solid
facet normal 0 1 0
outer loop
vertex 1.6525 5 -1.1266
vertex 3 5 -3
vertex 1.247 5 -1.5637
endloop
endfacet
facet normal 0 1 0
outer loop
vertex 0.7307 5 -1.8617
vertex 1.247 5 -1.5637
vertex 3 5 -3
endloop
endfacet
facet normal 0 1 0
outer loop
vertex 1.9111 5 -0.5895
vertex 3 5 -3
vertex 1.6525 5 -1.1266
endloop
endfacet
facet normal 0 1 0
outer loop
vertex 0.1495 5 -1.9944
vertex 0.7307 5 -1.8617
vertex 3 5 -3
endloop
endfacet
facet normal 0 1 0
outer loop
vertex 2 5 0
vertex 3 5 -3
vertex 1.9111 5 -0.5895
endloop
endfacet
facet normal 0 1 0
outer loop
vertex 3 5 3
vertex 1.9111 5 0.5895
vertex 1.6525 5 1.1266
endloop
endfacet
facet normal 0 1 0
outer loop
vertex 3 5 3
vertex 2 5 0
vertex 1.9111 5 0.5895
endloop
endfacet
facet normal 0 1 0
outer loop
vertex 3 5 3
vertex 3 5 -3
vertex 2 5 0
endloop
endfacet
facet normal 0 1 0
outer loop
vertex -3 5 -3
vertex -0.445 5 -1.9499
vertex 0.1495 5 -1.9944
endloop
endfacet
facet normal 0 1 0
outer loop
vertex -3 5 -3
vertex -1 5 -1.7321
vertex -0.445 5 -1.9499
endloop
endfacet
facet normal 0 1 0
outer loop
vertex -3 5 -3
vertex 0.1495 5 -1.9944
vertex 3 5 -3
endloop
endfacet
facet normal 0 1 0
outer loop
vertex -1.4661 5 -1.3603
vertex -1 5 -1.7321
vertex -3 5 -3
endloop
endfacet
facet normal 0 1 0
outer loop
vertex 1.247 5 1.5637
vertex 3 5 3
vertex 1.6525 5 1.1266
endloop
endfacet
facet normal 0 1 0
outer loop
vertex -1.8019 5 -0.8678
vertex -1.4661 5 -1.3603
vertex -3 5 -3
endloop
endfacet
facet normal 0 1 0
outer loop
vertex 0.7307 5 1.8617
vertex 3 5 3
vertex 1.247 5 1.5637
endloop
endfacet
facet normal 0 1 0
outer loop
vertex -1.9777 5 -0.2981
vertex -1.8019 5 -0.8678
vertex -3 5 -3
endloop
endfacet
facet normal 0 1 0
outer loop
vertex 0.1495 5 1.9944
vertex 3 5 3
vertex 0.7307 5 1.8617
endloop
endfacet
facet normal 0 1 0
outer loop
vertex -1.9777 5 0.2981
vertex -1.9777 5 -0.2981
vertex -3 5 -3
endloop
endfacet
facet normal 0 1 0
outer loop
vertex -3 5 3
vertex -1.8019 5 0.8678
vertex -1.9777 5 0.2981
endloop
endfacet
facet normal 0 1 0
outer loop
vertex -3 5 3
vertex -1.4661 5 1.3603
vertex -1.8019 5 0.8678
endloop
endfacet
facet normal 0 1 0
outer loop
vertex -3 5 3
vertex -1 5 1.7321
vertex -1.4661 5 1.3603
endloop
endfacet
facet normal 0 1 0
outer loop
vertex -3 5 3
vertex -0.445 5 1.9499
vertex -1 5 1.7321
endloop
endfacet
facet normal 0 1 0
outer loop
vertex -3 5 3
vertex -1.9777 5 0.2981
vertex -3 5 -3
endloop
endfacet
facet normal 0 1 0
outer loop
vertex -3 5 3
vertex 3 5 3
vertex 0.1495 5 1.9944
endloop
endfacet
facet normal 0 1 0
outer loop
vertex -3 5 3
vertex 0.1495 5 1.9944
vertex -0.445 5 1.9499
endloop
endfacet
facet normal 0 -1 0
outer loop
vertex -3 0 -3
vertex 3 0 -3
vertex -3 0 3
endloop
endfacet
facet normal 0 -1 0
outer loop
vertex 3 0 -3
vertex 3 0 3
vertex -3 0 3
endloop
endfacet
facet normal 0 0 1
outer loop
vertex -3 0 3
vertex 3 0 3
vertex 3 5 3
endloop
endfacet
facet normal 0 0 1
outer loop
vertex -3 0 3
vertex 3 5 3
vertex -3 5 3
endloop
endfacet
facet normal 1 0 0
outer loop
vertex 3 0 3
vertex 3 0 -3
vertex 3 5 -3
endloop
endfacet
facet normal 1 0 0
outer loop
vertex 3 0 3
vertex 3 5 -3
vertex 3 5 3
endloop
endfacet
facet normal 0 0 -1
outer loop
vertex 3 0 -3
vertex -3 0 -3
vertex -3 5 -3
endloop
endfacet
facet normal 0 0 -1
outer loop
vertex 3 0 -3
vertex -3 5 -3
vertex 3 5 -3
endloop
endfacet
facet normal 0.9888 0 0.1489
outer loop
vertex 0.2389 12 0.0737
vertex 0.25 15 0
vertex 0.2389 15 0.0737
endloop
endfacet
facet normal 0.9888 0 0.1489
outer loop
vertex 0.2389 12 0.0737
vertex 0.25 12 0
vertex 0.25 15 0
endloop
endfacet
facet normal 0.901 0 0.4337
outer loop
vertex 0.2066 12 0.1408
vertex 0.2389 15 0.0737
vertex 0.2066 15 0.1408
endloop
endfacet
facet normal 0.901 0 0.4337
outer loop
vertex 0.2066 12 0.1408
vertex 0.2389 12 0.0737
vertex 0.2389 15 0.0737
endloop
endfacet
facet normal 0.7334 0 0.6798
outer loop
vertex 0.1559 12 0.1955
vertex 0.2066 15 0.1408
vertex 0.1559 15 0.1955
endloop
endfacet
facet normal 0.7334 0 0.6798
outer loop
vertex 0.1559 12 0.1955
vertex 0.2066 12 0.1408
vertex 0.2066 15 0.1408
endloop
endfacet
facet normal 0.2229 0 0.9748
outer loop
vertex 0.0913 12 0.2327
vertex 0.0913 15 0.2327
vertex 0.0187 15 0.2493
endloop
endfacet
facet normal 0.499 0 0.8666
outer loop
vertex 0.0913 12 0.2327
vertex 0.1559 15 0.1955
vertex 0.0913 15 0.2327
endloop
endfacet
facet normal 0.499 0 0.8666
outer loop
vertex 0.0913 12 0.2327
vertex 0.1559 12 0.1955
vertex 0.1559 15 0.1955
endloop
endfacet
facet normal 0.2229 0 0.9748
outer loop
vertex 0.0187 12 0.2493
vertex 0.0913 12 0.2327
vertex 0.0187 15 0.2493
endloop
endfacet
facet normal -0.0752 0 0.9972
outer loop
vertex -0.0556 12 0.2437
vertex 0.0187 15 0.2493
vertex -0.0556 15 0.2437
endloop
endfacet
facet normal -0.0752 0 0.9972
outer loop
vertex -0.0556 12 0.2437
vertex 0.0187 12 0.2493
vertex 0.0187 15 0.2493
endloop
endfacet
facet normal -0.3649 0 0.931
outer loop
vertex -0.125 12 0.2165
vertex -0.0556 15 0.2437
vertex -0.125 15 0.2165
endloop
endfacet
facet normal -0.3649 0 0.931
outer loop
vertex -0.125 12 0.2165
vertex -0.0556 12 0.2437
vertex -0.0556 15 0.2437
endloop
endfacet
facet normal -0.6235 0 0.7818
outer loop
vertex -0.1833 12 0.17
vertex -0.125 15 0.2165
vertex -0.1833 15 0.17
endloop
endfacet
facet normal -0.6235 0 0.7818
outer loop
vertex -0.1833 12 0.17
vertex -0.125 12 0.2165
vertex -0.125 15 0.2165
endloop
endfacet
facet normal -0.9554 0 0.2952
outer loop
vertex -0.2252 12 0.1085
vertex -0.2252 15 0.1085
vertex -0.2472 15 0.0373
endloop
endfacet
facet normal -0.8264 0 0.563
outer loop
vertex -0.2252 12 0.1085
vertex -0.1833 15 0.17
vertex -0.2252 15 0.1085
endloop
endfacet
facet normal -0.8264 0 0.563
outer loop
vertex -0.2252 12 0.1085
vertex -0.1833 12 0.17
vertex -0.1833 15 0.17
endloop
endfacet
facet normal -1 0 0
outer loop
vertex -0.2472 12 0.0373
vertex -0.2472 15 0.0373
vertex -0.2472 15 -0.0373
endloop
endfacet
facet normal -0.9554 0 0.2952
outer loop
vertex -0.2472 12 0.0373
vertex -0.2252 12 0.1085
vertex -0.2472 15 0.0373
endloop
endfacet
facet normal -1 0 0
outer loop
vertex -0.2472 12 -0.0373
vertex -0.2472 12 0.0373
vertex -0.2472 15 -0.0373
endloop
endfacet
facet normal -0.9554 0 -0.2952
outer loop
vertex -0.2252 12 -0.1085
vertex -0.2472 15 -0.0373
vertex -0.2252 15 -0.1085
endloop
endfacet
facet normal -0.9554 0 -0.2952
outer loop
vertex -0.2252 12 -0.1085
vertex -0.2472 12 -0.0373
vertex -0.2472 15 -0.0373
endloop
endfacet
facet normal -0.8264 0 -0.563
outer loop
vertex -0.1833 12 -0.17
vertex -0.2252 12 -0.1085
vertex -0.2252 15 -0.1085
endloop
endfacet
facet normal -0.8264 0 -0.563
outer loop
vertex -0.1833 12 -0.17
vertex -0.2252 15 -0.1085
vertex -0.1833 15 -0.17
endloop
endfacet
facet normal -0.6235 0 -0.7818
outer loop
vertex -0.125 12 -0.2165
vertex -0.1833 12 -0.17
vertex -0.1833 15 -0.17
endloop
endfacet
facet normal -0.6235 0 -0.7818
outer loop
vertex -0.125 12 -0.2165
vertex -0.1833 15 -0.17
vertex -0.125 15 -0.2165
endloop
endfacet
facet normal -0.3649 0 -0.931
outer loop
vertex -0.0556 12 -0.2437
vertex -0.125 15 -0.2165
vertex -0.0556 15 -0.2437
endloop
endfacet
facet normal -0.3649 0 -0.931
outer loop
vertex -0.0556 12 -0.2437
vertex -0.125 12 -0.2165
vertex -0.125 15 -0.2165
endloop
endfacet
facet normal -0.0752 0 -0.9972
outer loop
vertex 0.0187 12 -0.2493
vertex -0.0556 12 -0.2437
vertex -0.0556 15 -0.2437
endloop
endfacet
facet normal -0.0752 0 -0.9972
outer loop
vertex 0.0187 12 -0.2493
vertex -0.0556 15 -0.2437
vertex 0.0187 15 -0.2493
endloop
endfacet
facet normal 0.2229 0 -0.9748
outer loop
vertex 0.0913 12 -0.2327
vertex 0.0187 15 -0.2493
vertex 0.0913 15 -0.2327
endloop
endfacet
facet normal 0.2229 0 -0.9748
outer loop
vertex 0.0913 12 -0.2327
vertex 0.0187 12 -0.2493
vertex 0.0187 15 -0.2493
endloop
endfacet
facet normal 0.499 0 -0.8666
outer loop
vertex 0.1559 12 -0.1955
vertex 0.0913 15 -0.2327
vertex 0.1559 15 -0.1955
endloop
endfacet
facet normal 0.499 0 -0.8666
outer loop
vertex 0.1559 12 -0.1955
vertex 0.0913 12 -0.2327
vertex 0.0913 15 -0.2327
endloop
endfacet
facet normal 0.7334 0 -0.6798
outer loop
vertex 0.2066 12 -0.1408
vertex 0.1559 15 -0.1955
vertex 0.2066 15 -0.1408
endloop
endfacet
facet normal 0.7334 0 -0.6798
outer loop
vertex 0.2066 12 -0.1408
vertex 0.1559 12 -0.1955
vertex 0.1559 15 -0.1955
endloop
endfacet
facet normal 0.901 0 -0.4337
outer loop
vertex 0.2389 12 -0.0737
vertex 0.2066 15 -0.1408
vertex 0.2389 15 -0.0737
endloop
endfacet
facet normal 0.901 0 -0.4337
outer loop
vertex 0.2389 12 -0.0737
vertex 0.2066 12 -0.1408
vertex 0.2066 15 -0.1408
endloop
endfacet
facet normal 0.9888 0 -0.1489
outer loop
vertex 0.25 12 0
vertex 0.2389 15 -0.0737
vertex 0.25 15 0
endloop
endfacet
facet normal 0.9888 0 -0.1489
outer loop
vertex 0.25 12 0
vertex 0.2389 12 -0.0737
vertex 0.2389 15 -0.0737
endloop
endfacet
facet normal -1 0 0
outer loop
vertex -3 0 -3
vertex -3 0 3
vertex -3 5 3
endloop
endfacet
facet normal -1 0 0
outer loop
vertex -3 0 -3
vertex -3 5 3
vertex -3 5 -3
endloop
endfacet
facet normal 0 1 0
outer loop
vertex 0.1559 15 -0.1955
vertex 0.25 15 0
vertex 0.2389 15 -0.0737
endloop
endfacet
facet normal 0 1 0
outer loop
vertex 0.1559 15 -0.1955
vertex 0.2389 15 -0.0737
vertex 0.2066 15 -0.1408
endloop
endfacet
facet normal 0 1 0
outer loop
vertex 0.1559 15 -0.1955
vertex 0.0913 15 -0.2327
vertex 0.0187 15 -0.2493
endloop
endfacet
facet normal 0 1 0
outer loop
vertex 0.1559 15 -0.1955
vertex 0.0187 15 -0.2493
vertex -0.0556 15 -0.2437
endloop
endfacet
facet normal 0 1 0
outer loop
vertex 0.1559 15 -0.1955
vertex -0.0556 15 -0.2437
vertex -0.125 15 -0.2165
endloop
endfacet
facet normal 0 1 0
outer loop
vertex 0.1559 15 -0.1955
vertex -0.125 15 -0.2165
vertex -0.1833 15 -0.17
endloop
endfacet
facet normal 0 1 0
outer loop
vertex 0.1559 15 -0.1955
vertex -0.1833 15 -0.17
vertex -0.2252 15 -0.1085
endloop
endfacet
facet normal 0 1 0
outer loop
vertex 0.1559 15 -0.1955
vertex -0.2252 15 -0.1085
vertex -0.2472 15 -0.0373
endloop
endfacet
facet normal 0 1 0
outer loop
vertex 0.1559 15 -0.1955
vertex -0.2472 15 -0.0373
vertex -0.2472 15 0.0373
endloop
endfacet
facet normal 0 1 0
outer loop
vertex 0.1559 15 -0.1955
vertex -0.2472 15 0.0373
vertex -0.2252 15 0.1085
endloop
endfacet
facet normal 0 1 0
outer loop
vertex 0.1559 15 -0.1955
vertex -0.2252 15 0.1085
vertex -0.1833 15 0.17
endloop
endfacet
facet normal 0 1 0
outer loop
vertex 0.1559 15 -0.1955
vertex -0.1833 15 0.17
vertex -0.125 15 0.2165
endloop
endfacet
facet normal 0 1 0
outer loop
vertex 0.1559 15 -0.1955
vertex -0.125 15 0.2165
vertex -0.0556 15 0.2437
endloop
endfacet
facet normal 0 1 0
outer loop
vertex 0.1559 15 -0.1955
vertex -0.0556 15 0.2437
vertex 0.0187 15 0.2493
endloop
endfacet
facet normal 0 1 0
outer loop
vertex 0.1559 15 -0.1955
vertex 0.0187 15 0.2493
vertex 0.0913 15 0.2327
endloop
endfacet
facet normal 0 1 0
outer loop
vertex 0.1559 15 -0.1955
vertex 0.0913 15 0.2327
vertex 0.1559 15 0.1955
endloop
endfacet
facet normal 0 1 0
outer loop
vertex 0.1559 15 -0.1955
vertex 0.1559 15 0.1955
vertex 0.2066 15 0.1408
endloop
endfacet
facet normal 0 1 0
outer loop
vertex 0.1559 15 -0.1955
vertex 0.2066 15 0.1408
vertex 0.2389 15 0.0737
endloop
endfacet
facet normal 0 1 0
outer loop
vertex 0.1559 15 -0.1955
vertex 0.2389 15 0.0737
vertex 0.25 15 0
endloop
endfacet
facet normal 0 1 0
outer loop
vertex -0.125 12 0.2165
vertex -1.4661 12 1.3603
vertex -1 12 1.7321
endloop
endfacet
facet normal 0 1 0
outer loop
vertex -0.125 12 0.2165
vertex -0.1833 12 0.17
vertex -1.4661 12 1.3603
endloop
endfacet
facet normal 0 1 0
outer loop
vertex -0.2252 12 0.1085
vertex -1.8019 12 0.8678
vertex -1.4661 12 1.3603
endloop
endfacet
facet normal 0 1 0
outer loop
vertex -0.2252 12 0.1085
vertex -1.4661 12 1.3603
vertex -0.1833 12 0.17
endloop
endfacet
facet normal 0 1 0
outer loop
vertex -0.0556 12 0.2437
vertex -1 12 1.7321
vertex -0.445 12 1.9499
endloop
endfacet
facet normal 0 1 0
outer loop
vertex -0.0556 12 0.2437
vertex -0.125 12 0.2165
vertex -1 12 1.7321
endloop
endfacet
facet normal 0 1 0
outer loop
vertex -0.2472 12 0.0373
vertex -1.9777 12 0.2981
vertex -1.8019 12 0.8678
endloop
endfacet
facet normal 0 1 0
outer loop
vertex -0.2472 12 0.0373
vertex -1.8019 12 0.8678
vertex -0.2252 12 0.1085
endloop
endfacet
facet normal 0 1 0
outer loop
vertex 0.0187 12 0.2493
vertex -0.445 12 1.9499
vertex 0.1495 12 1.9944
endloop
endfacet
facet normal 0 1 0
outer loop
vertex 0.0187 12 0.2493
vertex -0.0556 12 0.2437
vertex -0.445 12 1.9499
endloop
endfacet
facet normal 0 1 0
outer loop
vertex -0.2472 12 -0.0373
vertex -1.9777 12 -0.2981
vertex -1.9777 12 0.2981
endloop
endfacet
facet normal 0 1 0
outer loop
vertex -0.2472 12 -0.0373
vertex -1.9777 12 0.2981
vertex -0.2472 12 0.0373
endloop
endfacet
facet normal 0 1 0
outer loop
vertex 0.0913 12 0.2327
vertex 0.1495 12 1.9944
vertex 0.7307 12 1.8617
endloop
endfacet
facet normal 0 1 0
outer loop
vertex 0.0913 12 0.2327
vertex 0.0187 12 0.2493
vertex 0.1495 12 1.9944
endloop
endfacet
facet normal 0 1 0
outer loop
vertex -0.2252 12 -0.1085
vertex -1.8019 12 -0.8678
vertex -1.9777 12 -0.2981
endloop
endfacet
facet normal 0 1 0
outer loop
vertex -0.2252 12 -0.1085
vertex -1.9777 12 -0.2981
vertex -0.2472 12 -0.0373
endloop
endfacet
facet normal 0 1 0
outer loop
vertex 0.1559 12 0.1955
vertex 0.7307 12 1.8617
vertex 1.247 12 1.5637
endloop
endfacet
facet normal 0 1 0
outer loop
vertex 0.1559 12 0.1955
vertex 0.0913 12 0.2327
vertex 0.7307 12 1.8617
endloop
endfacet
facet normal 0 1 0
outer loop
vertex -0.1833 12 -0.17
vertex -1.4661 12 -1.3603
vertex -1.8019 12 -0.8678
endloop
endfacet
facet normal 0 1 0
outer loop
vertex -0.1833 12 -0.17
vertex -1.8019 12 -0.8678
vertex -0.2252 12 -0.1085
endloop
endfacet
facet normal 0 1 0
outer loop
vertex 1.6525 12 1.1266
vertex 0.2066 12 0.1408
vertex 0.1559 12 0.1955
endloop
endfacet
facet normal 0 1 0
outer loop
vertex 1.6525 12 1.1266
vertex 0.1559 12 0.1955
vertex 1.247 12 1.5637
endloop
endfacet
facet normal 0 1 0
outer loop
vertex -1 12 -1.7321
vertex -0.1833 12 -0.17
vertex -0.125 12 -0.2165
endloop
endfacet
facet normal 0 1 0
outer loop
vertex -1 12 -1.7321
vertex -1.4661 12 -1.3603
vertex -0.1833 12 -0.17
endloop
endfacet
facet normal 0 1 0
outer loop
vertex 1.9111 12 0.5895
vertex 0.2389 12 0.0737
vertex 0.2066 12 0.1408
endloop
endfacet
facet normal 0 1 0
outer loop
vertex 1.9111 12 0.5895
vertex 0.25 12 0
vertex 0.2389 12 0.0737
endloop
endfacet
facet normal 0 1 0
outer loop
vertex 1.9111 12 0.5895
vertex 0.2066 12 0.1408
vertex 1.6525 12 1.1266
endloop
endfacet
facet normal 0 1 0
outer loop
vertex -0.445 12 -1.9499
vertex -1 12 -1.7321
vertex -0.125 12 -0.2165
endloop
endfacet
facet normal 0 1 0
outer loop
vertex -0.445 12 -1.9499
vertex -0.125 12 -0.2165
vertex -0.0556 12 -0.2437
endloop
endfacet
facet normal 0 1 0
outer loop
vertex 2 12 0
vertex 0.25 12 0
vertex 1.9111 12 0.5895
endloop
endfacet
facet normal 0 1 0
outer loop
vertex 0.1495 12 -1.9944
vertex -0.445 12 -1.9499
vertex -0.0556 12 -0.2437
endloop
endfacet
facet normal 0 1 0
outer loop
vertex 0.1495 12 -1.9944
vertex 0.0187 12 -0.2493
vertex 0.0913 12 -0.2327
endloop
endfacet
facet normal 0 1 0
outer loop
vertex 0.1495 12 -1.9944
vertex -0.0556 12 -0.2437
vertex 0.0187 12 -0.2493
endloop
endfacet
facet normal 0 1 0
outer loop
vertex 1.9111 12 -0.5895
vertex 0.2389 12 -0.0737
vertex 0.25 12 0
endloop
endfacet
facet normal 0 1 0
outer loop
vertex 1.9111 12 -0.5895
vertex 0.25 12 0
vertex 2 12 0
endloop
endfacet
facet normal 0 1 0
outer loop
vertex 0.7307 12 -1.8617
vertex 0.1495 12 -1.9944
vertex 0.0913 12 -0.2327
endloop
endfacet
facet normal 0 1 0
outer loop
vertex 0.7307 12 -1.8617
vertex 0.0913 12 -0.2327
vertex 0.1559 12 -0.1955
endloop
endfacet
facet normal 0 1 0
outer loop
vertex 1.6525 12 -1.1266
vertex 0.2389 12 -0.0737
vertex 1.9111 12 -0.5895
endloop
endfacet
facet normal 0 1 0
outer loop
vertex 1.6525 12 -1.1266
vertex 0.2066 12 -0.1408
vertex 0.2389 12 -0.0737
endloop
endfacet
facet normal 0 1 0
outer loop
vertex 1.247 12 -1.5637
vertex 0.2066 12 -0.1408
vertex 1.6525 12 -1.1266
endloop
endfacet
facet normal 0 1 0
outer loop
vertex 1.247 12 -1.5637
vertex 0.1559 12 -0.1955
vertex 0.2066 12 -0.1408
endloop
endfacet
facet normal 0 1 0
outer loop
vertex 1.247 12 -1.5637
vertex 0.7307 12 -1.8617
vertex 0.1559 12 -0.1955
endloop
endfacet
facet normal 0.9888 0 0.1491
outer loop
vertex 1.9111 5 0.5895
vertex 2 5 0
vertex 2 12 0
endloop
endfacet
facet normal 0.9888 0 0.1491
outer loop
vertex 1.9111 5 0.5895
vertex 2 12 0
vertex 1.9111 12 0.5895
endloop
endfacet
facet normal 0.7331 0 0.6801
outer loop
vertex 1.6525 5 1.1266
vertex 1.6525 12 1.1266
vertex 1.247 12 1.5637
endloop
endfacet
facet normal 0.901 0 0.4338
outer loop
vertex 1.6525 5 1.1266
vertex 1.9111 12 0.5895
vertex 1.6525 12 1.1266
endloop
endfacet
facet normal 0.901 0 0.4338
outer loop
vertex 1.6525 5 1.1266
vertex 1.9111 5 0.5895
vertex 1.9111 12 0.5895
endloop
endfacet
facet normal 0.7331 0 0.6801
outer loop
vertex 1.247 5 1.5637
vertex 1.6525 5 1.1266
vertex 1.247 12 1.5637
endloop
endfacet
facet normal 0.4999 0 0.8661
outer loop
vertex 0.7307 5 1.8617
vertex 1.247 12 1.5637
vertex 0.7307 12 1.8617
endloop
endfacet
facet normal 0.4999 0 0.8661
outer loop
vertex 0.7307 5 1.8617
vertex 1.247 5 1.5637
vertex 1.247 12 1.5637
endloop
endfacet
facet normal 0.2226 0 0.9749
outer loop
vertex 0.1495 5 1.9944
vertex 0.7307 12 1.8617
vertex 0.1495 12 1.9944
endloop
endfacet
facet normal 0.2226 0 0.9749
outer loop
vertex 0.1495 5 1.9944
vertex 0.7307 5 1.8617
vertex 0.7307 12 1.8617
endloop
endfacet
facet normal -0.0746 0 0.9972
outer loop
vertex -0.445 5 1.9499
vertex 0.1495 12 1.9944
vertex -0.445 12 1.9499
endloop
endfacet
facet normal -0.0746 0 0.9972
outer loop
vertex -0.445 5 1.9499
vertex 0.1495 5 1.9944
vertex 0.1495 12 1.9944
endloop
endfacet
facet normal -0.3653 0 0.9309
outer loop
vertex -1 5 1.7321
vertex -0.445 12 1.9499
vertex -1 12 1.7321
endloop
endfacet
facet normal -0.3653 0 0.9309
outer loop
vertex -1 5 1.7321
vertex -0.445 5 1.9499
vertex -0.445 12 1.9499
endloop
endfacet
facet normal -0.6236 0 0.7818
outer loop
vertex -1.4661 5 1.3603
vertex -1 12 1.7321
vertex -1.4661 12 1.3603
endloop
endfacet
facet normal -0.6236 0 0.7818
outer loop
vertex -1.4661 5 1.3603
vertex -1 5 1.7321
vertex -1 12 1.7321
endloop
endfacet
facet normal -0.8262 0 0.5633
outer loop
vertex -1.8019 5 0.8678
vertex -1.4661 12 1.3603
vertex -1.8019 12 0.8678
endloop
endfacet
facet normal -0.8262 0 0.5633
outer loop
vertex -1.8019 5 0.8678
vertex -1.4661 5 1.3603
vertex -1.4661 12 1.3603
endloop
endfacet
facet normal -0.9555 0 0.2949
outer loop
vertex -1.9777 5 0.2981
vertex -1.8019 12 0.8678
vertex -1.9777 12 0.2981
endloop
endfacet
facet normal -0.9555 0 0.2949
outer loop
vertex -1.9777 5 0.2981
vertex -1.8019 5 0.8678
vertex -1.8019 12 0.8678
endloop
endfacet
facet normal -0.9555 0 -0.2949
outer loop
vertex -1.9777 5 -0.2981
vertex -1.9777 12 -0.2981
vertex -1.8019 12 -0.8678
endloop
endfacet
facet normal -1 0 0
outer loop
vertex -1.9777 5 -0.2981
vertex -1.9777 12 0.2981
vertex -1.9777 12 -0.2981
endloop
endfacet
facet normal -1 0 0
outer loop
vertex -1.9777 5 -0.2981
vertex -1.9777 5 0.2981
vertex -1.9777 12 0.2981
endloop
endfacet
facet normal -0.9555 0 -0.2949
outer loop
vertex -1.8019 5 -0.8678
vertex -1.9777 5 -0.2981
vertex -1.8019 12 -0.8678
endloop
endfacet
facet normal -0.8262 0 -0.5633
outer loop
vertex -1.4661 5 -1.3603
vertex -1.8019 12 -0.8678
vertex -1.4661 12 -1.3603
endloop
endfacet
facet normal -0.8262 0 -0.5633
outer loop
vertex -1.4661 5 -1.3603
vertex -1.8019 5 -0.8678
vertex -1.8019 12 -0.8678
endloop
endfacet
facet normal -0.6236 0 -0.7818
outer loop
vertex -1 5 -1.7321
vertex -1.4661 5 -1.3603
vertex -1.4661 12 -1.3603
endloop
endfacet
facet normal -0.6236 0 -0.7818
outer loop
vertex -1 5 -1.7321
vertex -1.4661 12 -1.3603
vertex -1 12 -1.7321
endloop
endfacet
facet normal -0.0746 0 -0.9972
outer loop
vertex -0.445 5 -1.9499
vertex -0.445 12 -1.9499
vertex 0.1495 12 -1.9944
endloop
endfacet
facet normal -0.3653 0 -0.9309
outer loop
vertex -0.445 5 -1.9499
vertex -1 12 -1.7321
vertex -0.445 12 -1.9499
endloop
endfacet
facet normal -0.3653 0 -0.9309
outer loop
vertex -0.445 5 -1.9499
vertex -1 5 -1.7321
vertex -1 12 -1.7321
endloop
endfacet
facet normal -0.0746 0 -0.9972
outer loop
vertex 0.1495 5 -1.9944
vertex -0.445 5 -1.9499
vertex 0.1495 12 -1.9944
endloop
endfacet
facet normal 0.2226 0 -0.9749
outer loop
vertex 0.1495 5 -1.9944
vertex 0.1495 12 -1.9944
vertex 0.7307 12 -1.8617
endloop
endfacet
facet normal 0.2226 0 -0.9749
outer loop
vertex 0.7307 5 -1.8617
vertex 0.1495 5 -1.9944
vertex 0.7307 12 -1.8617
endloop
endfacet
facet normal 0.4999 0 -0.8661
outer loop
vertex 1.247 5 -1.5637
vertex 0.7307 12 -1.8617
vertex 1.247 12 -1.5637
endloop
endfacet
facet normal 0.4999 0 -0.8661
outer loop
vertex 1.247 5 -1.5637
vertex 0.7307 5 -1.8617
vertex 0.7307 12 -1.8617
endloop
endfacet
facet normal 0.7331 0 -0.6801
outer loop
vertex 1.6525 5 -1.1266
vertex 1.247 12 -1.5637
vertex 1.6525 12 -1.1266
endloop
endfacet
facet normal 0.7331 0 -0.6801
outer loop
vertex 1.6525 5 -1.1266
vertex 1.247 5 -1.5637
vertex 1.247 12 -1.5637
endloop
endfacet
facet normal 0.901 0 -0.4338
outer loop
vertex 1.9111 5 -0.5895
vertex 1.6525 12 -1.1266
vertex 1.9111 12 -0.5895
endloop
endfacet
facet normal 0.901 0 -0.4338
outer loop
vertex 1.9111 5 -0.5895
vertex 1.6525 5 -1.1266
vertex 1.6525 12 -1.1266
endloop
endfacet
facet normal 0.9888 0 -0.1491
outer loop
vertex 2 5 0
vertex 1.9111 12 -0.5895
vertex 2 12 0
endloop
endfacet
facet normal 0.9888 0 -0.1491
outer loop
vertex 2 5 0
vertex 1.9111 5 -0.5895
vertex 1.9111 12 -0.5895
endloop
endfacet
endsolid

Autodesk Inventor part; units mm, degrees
ref_plane "YZ Plane" through (0, 0, 0) normal (1, 0, 0) x (0, 1, 0)
ref_plane "XZ Plane" through (0, 0, 0) normal (0, 1, 0) x (-1, 0, 0)
ref_plane "XY Plane" through (0, 0, 0) normal (0, 0, 1) x (1, 0, 0)
sketch "Boceto1" plane through (0, 0, 0) normal (0, 1, 0) x (-1, 0, 0)
  line L0 (-3, 3) -> (3, 3)
  line L1 (3, 3) -> (3, -3)
  line L2 (3, -3) -> (-3, -3)
  line L3 (-3, -3) -> (-3, 3)
  line L4 (-3, 3) -> (3, -3) construction
  line L5 (3, 3) -> (-3, -3) construction
  point P0 (0, 0)
  dimension "d0" = 6
  dimension "d1" = 6
extrude "Extrusión1" add sketch "Boceto1" along normal blind 5
sketch "Boceto2" plane through (0, 5, 0) normal (0, 1, 0) x (1, 0, 0)
  circle A0 centre (0, 0) radius 2
  dimension "d4" = 4
extrude "Extrusión2" add sketch "Boceto2" along normal blind 7
sketch "Boceto3" plane through (0, 12, 0) normal (0, 1, 0) x (1, 0, 0)
  circle A0 centre (0, 0) radius 0.25
  dimension "d7" = 0.5
extrude "Extrusión3" add sketch "Boceto3" along normal blind 3
properties part number "Herramienta" material "Hierro, fundido"
